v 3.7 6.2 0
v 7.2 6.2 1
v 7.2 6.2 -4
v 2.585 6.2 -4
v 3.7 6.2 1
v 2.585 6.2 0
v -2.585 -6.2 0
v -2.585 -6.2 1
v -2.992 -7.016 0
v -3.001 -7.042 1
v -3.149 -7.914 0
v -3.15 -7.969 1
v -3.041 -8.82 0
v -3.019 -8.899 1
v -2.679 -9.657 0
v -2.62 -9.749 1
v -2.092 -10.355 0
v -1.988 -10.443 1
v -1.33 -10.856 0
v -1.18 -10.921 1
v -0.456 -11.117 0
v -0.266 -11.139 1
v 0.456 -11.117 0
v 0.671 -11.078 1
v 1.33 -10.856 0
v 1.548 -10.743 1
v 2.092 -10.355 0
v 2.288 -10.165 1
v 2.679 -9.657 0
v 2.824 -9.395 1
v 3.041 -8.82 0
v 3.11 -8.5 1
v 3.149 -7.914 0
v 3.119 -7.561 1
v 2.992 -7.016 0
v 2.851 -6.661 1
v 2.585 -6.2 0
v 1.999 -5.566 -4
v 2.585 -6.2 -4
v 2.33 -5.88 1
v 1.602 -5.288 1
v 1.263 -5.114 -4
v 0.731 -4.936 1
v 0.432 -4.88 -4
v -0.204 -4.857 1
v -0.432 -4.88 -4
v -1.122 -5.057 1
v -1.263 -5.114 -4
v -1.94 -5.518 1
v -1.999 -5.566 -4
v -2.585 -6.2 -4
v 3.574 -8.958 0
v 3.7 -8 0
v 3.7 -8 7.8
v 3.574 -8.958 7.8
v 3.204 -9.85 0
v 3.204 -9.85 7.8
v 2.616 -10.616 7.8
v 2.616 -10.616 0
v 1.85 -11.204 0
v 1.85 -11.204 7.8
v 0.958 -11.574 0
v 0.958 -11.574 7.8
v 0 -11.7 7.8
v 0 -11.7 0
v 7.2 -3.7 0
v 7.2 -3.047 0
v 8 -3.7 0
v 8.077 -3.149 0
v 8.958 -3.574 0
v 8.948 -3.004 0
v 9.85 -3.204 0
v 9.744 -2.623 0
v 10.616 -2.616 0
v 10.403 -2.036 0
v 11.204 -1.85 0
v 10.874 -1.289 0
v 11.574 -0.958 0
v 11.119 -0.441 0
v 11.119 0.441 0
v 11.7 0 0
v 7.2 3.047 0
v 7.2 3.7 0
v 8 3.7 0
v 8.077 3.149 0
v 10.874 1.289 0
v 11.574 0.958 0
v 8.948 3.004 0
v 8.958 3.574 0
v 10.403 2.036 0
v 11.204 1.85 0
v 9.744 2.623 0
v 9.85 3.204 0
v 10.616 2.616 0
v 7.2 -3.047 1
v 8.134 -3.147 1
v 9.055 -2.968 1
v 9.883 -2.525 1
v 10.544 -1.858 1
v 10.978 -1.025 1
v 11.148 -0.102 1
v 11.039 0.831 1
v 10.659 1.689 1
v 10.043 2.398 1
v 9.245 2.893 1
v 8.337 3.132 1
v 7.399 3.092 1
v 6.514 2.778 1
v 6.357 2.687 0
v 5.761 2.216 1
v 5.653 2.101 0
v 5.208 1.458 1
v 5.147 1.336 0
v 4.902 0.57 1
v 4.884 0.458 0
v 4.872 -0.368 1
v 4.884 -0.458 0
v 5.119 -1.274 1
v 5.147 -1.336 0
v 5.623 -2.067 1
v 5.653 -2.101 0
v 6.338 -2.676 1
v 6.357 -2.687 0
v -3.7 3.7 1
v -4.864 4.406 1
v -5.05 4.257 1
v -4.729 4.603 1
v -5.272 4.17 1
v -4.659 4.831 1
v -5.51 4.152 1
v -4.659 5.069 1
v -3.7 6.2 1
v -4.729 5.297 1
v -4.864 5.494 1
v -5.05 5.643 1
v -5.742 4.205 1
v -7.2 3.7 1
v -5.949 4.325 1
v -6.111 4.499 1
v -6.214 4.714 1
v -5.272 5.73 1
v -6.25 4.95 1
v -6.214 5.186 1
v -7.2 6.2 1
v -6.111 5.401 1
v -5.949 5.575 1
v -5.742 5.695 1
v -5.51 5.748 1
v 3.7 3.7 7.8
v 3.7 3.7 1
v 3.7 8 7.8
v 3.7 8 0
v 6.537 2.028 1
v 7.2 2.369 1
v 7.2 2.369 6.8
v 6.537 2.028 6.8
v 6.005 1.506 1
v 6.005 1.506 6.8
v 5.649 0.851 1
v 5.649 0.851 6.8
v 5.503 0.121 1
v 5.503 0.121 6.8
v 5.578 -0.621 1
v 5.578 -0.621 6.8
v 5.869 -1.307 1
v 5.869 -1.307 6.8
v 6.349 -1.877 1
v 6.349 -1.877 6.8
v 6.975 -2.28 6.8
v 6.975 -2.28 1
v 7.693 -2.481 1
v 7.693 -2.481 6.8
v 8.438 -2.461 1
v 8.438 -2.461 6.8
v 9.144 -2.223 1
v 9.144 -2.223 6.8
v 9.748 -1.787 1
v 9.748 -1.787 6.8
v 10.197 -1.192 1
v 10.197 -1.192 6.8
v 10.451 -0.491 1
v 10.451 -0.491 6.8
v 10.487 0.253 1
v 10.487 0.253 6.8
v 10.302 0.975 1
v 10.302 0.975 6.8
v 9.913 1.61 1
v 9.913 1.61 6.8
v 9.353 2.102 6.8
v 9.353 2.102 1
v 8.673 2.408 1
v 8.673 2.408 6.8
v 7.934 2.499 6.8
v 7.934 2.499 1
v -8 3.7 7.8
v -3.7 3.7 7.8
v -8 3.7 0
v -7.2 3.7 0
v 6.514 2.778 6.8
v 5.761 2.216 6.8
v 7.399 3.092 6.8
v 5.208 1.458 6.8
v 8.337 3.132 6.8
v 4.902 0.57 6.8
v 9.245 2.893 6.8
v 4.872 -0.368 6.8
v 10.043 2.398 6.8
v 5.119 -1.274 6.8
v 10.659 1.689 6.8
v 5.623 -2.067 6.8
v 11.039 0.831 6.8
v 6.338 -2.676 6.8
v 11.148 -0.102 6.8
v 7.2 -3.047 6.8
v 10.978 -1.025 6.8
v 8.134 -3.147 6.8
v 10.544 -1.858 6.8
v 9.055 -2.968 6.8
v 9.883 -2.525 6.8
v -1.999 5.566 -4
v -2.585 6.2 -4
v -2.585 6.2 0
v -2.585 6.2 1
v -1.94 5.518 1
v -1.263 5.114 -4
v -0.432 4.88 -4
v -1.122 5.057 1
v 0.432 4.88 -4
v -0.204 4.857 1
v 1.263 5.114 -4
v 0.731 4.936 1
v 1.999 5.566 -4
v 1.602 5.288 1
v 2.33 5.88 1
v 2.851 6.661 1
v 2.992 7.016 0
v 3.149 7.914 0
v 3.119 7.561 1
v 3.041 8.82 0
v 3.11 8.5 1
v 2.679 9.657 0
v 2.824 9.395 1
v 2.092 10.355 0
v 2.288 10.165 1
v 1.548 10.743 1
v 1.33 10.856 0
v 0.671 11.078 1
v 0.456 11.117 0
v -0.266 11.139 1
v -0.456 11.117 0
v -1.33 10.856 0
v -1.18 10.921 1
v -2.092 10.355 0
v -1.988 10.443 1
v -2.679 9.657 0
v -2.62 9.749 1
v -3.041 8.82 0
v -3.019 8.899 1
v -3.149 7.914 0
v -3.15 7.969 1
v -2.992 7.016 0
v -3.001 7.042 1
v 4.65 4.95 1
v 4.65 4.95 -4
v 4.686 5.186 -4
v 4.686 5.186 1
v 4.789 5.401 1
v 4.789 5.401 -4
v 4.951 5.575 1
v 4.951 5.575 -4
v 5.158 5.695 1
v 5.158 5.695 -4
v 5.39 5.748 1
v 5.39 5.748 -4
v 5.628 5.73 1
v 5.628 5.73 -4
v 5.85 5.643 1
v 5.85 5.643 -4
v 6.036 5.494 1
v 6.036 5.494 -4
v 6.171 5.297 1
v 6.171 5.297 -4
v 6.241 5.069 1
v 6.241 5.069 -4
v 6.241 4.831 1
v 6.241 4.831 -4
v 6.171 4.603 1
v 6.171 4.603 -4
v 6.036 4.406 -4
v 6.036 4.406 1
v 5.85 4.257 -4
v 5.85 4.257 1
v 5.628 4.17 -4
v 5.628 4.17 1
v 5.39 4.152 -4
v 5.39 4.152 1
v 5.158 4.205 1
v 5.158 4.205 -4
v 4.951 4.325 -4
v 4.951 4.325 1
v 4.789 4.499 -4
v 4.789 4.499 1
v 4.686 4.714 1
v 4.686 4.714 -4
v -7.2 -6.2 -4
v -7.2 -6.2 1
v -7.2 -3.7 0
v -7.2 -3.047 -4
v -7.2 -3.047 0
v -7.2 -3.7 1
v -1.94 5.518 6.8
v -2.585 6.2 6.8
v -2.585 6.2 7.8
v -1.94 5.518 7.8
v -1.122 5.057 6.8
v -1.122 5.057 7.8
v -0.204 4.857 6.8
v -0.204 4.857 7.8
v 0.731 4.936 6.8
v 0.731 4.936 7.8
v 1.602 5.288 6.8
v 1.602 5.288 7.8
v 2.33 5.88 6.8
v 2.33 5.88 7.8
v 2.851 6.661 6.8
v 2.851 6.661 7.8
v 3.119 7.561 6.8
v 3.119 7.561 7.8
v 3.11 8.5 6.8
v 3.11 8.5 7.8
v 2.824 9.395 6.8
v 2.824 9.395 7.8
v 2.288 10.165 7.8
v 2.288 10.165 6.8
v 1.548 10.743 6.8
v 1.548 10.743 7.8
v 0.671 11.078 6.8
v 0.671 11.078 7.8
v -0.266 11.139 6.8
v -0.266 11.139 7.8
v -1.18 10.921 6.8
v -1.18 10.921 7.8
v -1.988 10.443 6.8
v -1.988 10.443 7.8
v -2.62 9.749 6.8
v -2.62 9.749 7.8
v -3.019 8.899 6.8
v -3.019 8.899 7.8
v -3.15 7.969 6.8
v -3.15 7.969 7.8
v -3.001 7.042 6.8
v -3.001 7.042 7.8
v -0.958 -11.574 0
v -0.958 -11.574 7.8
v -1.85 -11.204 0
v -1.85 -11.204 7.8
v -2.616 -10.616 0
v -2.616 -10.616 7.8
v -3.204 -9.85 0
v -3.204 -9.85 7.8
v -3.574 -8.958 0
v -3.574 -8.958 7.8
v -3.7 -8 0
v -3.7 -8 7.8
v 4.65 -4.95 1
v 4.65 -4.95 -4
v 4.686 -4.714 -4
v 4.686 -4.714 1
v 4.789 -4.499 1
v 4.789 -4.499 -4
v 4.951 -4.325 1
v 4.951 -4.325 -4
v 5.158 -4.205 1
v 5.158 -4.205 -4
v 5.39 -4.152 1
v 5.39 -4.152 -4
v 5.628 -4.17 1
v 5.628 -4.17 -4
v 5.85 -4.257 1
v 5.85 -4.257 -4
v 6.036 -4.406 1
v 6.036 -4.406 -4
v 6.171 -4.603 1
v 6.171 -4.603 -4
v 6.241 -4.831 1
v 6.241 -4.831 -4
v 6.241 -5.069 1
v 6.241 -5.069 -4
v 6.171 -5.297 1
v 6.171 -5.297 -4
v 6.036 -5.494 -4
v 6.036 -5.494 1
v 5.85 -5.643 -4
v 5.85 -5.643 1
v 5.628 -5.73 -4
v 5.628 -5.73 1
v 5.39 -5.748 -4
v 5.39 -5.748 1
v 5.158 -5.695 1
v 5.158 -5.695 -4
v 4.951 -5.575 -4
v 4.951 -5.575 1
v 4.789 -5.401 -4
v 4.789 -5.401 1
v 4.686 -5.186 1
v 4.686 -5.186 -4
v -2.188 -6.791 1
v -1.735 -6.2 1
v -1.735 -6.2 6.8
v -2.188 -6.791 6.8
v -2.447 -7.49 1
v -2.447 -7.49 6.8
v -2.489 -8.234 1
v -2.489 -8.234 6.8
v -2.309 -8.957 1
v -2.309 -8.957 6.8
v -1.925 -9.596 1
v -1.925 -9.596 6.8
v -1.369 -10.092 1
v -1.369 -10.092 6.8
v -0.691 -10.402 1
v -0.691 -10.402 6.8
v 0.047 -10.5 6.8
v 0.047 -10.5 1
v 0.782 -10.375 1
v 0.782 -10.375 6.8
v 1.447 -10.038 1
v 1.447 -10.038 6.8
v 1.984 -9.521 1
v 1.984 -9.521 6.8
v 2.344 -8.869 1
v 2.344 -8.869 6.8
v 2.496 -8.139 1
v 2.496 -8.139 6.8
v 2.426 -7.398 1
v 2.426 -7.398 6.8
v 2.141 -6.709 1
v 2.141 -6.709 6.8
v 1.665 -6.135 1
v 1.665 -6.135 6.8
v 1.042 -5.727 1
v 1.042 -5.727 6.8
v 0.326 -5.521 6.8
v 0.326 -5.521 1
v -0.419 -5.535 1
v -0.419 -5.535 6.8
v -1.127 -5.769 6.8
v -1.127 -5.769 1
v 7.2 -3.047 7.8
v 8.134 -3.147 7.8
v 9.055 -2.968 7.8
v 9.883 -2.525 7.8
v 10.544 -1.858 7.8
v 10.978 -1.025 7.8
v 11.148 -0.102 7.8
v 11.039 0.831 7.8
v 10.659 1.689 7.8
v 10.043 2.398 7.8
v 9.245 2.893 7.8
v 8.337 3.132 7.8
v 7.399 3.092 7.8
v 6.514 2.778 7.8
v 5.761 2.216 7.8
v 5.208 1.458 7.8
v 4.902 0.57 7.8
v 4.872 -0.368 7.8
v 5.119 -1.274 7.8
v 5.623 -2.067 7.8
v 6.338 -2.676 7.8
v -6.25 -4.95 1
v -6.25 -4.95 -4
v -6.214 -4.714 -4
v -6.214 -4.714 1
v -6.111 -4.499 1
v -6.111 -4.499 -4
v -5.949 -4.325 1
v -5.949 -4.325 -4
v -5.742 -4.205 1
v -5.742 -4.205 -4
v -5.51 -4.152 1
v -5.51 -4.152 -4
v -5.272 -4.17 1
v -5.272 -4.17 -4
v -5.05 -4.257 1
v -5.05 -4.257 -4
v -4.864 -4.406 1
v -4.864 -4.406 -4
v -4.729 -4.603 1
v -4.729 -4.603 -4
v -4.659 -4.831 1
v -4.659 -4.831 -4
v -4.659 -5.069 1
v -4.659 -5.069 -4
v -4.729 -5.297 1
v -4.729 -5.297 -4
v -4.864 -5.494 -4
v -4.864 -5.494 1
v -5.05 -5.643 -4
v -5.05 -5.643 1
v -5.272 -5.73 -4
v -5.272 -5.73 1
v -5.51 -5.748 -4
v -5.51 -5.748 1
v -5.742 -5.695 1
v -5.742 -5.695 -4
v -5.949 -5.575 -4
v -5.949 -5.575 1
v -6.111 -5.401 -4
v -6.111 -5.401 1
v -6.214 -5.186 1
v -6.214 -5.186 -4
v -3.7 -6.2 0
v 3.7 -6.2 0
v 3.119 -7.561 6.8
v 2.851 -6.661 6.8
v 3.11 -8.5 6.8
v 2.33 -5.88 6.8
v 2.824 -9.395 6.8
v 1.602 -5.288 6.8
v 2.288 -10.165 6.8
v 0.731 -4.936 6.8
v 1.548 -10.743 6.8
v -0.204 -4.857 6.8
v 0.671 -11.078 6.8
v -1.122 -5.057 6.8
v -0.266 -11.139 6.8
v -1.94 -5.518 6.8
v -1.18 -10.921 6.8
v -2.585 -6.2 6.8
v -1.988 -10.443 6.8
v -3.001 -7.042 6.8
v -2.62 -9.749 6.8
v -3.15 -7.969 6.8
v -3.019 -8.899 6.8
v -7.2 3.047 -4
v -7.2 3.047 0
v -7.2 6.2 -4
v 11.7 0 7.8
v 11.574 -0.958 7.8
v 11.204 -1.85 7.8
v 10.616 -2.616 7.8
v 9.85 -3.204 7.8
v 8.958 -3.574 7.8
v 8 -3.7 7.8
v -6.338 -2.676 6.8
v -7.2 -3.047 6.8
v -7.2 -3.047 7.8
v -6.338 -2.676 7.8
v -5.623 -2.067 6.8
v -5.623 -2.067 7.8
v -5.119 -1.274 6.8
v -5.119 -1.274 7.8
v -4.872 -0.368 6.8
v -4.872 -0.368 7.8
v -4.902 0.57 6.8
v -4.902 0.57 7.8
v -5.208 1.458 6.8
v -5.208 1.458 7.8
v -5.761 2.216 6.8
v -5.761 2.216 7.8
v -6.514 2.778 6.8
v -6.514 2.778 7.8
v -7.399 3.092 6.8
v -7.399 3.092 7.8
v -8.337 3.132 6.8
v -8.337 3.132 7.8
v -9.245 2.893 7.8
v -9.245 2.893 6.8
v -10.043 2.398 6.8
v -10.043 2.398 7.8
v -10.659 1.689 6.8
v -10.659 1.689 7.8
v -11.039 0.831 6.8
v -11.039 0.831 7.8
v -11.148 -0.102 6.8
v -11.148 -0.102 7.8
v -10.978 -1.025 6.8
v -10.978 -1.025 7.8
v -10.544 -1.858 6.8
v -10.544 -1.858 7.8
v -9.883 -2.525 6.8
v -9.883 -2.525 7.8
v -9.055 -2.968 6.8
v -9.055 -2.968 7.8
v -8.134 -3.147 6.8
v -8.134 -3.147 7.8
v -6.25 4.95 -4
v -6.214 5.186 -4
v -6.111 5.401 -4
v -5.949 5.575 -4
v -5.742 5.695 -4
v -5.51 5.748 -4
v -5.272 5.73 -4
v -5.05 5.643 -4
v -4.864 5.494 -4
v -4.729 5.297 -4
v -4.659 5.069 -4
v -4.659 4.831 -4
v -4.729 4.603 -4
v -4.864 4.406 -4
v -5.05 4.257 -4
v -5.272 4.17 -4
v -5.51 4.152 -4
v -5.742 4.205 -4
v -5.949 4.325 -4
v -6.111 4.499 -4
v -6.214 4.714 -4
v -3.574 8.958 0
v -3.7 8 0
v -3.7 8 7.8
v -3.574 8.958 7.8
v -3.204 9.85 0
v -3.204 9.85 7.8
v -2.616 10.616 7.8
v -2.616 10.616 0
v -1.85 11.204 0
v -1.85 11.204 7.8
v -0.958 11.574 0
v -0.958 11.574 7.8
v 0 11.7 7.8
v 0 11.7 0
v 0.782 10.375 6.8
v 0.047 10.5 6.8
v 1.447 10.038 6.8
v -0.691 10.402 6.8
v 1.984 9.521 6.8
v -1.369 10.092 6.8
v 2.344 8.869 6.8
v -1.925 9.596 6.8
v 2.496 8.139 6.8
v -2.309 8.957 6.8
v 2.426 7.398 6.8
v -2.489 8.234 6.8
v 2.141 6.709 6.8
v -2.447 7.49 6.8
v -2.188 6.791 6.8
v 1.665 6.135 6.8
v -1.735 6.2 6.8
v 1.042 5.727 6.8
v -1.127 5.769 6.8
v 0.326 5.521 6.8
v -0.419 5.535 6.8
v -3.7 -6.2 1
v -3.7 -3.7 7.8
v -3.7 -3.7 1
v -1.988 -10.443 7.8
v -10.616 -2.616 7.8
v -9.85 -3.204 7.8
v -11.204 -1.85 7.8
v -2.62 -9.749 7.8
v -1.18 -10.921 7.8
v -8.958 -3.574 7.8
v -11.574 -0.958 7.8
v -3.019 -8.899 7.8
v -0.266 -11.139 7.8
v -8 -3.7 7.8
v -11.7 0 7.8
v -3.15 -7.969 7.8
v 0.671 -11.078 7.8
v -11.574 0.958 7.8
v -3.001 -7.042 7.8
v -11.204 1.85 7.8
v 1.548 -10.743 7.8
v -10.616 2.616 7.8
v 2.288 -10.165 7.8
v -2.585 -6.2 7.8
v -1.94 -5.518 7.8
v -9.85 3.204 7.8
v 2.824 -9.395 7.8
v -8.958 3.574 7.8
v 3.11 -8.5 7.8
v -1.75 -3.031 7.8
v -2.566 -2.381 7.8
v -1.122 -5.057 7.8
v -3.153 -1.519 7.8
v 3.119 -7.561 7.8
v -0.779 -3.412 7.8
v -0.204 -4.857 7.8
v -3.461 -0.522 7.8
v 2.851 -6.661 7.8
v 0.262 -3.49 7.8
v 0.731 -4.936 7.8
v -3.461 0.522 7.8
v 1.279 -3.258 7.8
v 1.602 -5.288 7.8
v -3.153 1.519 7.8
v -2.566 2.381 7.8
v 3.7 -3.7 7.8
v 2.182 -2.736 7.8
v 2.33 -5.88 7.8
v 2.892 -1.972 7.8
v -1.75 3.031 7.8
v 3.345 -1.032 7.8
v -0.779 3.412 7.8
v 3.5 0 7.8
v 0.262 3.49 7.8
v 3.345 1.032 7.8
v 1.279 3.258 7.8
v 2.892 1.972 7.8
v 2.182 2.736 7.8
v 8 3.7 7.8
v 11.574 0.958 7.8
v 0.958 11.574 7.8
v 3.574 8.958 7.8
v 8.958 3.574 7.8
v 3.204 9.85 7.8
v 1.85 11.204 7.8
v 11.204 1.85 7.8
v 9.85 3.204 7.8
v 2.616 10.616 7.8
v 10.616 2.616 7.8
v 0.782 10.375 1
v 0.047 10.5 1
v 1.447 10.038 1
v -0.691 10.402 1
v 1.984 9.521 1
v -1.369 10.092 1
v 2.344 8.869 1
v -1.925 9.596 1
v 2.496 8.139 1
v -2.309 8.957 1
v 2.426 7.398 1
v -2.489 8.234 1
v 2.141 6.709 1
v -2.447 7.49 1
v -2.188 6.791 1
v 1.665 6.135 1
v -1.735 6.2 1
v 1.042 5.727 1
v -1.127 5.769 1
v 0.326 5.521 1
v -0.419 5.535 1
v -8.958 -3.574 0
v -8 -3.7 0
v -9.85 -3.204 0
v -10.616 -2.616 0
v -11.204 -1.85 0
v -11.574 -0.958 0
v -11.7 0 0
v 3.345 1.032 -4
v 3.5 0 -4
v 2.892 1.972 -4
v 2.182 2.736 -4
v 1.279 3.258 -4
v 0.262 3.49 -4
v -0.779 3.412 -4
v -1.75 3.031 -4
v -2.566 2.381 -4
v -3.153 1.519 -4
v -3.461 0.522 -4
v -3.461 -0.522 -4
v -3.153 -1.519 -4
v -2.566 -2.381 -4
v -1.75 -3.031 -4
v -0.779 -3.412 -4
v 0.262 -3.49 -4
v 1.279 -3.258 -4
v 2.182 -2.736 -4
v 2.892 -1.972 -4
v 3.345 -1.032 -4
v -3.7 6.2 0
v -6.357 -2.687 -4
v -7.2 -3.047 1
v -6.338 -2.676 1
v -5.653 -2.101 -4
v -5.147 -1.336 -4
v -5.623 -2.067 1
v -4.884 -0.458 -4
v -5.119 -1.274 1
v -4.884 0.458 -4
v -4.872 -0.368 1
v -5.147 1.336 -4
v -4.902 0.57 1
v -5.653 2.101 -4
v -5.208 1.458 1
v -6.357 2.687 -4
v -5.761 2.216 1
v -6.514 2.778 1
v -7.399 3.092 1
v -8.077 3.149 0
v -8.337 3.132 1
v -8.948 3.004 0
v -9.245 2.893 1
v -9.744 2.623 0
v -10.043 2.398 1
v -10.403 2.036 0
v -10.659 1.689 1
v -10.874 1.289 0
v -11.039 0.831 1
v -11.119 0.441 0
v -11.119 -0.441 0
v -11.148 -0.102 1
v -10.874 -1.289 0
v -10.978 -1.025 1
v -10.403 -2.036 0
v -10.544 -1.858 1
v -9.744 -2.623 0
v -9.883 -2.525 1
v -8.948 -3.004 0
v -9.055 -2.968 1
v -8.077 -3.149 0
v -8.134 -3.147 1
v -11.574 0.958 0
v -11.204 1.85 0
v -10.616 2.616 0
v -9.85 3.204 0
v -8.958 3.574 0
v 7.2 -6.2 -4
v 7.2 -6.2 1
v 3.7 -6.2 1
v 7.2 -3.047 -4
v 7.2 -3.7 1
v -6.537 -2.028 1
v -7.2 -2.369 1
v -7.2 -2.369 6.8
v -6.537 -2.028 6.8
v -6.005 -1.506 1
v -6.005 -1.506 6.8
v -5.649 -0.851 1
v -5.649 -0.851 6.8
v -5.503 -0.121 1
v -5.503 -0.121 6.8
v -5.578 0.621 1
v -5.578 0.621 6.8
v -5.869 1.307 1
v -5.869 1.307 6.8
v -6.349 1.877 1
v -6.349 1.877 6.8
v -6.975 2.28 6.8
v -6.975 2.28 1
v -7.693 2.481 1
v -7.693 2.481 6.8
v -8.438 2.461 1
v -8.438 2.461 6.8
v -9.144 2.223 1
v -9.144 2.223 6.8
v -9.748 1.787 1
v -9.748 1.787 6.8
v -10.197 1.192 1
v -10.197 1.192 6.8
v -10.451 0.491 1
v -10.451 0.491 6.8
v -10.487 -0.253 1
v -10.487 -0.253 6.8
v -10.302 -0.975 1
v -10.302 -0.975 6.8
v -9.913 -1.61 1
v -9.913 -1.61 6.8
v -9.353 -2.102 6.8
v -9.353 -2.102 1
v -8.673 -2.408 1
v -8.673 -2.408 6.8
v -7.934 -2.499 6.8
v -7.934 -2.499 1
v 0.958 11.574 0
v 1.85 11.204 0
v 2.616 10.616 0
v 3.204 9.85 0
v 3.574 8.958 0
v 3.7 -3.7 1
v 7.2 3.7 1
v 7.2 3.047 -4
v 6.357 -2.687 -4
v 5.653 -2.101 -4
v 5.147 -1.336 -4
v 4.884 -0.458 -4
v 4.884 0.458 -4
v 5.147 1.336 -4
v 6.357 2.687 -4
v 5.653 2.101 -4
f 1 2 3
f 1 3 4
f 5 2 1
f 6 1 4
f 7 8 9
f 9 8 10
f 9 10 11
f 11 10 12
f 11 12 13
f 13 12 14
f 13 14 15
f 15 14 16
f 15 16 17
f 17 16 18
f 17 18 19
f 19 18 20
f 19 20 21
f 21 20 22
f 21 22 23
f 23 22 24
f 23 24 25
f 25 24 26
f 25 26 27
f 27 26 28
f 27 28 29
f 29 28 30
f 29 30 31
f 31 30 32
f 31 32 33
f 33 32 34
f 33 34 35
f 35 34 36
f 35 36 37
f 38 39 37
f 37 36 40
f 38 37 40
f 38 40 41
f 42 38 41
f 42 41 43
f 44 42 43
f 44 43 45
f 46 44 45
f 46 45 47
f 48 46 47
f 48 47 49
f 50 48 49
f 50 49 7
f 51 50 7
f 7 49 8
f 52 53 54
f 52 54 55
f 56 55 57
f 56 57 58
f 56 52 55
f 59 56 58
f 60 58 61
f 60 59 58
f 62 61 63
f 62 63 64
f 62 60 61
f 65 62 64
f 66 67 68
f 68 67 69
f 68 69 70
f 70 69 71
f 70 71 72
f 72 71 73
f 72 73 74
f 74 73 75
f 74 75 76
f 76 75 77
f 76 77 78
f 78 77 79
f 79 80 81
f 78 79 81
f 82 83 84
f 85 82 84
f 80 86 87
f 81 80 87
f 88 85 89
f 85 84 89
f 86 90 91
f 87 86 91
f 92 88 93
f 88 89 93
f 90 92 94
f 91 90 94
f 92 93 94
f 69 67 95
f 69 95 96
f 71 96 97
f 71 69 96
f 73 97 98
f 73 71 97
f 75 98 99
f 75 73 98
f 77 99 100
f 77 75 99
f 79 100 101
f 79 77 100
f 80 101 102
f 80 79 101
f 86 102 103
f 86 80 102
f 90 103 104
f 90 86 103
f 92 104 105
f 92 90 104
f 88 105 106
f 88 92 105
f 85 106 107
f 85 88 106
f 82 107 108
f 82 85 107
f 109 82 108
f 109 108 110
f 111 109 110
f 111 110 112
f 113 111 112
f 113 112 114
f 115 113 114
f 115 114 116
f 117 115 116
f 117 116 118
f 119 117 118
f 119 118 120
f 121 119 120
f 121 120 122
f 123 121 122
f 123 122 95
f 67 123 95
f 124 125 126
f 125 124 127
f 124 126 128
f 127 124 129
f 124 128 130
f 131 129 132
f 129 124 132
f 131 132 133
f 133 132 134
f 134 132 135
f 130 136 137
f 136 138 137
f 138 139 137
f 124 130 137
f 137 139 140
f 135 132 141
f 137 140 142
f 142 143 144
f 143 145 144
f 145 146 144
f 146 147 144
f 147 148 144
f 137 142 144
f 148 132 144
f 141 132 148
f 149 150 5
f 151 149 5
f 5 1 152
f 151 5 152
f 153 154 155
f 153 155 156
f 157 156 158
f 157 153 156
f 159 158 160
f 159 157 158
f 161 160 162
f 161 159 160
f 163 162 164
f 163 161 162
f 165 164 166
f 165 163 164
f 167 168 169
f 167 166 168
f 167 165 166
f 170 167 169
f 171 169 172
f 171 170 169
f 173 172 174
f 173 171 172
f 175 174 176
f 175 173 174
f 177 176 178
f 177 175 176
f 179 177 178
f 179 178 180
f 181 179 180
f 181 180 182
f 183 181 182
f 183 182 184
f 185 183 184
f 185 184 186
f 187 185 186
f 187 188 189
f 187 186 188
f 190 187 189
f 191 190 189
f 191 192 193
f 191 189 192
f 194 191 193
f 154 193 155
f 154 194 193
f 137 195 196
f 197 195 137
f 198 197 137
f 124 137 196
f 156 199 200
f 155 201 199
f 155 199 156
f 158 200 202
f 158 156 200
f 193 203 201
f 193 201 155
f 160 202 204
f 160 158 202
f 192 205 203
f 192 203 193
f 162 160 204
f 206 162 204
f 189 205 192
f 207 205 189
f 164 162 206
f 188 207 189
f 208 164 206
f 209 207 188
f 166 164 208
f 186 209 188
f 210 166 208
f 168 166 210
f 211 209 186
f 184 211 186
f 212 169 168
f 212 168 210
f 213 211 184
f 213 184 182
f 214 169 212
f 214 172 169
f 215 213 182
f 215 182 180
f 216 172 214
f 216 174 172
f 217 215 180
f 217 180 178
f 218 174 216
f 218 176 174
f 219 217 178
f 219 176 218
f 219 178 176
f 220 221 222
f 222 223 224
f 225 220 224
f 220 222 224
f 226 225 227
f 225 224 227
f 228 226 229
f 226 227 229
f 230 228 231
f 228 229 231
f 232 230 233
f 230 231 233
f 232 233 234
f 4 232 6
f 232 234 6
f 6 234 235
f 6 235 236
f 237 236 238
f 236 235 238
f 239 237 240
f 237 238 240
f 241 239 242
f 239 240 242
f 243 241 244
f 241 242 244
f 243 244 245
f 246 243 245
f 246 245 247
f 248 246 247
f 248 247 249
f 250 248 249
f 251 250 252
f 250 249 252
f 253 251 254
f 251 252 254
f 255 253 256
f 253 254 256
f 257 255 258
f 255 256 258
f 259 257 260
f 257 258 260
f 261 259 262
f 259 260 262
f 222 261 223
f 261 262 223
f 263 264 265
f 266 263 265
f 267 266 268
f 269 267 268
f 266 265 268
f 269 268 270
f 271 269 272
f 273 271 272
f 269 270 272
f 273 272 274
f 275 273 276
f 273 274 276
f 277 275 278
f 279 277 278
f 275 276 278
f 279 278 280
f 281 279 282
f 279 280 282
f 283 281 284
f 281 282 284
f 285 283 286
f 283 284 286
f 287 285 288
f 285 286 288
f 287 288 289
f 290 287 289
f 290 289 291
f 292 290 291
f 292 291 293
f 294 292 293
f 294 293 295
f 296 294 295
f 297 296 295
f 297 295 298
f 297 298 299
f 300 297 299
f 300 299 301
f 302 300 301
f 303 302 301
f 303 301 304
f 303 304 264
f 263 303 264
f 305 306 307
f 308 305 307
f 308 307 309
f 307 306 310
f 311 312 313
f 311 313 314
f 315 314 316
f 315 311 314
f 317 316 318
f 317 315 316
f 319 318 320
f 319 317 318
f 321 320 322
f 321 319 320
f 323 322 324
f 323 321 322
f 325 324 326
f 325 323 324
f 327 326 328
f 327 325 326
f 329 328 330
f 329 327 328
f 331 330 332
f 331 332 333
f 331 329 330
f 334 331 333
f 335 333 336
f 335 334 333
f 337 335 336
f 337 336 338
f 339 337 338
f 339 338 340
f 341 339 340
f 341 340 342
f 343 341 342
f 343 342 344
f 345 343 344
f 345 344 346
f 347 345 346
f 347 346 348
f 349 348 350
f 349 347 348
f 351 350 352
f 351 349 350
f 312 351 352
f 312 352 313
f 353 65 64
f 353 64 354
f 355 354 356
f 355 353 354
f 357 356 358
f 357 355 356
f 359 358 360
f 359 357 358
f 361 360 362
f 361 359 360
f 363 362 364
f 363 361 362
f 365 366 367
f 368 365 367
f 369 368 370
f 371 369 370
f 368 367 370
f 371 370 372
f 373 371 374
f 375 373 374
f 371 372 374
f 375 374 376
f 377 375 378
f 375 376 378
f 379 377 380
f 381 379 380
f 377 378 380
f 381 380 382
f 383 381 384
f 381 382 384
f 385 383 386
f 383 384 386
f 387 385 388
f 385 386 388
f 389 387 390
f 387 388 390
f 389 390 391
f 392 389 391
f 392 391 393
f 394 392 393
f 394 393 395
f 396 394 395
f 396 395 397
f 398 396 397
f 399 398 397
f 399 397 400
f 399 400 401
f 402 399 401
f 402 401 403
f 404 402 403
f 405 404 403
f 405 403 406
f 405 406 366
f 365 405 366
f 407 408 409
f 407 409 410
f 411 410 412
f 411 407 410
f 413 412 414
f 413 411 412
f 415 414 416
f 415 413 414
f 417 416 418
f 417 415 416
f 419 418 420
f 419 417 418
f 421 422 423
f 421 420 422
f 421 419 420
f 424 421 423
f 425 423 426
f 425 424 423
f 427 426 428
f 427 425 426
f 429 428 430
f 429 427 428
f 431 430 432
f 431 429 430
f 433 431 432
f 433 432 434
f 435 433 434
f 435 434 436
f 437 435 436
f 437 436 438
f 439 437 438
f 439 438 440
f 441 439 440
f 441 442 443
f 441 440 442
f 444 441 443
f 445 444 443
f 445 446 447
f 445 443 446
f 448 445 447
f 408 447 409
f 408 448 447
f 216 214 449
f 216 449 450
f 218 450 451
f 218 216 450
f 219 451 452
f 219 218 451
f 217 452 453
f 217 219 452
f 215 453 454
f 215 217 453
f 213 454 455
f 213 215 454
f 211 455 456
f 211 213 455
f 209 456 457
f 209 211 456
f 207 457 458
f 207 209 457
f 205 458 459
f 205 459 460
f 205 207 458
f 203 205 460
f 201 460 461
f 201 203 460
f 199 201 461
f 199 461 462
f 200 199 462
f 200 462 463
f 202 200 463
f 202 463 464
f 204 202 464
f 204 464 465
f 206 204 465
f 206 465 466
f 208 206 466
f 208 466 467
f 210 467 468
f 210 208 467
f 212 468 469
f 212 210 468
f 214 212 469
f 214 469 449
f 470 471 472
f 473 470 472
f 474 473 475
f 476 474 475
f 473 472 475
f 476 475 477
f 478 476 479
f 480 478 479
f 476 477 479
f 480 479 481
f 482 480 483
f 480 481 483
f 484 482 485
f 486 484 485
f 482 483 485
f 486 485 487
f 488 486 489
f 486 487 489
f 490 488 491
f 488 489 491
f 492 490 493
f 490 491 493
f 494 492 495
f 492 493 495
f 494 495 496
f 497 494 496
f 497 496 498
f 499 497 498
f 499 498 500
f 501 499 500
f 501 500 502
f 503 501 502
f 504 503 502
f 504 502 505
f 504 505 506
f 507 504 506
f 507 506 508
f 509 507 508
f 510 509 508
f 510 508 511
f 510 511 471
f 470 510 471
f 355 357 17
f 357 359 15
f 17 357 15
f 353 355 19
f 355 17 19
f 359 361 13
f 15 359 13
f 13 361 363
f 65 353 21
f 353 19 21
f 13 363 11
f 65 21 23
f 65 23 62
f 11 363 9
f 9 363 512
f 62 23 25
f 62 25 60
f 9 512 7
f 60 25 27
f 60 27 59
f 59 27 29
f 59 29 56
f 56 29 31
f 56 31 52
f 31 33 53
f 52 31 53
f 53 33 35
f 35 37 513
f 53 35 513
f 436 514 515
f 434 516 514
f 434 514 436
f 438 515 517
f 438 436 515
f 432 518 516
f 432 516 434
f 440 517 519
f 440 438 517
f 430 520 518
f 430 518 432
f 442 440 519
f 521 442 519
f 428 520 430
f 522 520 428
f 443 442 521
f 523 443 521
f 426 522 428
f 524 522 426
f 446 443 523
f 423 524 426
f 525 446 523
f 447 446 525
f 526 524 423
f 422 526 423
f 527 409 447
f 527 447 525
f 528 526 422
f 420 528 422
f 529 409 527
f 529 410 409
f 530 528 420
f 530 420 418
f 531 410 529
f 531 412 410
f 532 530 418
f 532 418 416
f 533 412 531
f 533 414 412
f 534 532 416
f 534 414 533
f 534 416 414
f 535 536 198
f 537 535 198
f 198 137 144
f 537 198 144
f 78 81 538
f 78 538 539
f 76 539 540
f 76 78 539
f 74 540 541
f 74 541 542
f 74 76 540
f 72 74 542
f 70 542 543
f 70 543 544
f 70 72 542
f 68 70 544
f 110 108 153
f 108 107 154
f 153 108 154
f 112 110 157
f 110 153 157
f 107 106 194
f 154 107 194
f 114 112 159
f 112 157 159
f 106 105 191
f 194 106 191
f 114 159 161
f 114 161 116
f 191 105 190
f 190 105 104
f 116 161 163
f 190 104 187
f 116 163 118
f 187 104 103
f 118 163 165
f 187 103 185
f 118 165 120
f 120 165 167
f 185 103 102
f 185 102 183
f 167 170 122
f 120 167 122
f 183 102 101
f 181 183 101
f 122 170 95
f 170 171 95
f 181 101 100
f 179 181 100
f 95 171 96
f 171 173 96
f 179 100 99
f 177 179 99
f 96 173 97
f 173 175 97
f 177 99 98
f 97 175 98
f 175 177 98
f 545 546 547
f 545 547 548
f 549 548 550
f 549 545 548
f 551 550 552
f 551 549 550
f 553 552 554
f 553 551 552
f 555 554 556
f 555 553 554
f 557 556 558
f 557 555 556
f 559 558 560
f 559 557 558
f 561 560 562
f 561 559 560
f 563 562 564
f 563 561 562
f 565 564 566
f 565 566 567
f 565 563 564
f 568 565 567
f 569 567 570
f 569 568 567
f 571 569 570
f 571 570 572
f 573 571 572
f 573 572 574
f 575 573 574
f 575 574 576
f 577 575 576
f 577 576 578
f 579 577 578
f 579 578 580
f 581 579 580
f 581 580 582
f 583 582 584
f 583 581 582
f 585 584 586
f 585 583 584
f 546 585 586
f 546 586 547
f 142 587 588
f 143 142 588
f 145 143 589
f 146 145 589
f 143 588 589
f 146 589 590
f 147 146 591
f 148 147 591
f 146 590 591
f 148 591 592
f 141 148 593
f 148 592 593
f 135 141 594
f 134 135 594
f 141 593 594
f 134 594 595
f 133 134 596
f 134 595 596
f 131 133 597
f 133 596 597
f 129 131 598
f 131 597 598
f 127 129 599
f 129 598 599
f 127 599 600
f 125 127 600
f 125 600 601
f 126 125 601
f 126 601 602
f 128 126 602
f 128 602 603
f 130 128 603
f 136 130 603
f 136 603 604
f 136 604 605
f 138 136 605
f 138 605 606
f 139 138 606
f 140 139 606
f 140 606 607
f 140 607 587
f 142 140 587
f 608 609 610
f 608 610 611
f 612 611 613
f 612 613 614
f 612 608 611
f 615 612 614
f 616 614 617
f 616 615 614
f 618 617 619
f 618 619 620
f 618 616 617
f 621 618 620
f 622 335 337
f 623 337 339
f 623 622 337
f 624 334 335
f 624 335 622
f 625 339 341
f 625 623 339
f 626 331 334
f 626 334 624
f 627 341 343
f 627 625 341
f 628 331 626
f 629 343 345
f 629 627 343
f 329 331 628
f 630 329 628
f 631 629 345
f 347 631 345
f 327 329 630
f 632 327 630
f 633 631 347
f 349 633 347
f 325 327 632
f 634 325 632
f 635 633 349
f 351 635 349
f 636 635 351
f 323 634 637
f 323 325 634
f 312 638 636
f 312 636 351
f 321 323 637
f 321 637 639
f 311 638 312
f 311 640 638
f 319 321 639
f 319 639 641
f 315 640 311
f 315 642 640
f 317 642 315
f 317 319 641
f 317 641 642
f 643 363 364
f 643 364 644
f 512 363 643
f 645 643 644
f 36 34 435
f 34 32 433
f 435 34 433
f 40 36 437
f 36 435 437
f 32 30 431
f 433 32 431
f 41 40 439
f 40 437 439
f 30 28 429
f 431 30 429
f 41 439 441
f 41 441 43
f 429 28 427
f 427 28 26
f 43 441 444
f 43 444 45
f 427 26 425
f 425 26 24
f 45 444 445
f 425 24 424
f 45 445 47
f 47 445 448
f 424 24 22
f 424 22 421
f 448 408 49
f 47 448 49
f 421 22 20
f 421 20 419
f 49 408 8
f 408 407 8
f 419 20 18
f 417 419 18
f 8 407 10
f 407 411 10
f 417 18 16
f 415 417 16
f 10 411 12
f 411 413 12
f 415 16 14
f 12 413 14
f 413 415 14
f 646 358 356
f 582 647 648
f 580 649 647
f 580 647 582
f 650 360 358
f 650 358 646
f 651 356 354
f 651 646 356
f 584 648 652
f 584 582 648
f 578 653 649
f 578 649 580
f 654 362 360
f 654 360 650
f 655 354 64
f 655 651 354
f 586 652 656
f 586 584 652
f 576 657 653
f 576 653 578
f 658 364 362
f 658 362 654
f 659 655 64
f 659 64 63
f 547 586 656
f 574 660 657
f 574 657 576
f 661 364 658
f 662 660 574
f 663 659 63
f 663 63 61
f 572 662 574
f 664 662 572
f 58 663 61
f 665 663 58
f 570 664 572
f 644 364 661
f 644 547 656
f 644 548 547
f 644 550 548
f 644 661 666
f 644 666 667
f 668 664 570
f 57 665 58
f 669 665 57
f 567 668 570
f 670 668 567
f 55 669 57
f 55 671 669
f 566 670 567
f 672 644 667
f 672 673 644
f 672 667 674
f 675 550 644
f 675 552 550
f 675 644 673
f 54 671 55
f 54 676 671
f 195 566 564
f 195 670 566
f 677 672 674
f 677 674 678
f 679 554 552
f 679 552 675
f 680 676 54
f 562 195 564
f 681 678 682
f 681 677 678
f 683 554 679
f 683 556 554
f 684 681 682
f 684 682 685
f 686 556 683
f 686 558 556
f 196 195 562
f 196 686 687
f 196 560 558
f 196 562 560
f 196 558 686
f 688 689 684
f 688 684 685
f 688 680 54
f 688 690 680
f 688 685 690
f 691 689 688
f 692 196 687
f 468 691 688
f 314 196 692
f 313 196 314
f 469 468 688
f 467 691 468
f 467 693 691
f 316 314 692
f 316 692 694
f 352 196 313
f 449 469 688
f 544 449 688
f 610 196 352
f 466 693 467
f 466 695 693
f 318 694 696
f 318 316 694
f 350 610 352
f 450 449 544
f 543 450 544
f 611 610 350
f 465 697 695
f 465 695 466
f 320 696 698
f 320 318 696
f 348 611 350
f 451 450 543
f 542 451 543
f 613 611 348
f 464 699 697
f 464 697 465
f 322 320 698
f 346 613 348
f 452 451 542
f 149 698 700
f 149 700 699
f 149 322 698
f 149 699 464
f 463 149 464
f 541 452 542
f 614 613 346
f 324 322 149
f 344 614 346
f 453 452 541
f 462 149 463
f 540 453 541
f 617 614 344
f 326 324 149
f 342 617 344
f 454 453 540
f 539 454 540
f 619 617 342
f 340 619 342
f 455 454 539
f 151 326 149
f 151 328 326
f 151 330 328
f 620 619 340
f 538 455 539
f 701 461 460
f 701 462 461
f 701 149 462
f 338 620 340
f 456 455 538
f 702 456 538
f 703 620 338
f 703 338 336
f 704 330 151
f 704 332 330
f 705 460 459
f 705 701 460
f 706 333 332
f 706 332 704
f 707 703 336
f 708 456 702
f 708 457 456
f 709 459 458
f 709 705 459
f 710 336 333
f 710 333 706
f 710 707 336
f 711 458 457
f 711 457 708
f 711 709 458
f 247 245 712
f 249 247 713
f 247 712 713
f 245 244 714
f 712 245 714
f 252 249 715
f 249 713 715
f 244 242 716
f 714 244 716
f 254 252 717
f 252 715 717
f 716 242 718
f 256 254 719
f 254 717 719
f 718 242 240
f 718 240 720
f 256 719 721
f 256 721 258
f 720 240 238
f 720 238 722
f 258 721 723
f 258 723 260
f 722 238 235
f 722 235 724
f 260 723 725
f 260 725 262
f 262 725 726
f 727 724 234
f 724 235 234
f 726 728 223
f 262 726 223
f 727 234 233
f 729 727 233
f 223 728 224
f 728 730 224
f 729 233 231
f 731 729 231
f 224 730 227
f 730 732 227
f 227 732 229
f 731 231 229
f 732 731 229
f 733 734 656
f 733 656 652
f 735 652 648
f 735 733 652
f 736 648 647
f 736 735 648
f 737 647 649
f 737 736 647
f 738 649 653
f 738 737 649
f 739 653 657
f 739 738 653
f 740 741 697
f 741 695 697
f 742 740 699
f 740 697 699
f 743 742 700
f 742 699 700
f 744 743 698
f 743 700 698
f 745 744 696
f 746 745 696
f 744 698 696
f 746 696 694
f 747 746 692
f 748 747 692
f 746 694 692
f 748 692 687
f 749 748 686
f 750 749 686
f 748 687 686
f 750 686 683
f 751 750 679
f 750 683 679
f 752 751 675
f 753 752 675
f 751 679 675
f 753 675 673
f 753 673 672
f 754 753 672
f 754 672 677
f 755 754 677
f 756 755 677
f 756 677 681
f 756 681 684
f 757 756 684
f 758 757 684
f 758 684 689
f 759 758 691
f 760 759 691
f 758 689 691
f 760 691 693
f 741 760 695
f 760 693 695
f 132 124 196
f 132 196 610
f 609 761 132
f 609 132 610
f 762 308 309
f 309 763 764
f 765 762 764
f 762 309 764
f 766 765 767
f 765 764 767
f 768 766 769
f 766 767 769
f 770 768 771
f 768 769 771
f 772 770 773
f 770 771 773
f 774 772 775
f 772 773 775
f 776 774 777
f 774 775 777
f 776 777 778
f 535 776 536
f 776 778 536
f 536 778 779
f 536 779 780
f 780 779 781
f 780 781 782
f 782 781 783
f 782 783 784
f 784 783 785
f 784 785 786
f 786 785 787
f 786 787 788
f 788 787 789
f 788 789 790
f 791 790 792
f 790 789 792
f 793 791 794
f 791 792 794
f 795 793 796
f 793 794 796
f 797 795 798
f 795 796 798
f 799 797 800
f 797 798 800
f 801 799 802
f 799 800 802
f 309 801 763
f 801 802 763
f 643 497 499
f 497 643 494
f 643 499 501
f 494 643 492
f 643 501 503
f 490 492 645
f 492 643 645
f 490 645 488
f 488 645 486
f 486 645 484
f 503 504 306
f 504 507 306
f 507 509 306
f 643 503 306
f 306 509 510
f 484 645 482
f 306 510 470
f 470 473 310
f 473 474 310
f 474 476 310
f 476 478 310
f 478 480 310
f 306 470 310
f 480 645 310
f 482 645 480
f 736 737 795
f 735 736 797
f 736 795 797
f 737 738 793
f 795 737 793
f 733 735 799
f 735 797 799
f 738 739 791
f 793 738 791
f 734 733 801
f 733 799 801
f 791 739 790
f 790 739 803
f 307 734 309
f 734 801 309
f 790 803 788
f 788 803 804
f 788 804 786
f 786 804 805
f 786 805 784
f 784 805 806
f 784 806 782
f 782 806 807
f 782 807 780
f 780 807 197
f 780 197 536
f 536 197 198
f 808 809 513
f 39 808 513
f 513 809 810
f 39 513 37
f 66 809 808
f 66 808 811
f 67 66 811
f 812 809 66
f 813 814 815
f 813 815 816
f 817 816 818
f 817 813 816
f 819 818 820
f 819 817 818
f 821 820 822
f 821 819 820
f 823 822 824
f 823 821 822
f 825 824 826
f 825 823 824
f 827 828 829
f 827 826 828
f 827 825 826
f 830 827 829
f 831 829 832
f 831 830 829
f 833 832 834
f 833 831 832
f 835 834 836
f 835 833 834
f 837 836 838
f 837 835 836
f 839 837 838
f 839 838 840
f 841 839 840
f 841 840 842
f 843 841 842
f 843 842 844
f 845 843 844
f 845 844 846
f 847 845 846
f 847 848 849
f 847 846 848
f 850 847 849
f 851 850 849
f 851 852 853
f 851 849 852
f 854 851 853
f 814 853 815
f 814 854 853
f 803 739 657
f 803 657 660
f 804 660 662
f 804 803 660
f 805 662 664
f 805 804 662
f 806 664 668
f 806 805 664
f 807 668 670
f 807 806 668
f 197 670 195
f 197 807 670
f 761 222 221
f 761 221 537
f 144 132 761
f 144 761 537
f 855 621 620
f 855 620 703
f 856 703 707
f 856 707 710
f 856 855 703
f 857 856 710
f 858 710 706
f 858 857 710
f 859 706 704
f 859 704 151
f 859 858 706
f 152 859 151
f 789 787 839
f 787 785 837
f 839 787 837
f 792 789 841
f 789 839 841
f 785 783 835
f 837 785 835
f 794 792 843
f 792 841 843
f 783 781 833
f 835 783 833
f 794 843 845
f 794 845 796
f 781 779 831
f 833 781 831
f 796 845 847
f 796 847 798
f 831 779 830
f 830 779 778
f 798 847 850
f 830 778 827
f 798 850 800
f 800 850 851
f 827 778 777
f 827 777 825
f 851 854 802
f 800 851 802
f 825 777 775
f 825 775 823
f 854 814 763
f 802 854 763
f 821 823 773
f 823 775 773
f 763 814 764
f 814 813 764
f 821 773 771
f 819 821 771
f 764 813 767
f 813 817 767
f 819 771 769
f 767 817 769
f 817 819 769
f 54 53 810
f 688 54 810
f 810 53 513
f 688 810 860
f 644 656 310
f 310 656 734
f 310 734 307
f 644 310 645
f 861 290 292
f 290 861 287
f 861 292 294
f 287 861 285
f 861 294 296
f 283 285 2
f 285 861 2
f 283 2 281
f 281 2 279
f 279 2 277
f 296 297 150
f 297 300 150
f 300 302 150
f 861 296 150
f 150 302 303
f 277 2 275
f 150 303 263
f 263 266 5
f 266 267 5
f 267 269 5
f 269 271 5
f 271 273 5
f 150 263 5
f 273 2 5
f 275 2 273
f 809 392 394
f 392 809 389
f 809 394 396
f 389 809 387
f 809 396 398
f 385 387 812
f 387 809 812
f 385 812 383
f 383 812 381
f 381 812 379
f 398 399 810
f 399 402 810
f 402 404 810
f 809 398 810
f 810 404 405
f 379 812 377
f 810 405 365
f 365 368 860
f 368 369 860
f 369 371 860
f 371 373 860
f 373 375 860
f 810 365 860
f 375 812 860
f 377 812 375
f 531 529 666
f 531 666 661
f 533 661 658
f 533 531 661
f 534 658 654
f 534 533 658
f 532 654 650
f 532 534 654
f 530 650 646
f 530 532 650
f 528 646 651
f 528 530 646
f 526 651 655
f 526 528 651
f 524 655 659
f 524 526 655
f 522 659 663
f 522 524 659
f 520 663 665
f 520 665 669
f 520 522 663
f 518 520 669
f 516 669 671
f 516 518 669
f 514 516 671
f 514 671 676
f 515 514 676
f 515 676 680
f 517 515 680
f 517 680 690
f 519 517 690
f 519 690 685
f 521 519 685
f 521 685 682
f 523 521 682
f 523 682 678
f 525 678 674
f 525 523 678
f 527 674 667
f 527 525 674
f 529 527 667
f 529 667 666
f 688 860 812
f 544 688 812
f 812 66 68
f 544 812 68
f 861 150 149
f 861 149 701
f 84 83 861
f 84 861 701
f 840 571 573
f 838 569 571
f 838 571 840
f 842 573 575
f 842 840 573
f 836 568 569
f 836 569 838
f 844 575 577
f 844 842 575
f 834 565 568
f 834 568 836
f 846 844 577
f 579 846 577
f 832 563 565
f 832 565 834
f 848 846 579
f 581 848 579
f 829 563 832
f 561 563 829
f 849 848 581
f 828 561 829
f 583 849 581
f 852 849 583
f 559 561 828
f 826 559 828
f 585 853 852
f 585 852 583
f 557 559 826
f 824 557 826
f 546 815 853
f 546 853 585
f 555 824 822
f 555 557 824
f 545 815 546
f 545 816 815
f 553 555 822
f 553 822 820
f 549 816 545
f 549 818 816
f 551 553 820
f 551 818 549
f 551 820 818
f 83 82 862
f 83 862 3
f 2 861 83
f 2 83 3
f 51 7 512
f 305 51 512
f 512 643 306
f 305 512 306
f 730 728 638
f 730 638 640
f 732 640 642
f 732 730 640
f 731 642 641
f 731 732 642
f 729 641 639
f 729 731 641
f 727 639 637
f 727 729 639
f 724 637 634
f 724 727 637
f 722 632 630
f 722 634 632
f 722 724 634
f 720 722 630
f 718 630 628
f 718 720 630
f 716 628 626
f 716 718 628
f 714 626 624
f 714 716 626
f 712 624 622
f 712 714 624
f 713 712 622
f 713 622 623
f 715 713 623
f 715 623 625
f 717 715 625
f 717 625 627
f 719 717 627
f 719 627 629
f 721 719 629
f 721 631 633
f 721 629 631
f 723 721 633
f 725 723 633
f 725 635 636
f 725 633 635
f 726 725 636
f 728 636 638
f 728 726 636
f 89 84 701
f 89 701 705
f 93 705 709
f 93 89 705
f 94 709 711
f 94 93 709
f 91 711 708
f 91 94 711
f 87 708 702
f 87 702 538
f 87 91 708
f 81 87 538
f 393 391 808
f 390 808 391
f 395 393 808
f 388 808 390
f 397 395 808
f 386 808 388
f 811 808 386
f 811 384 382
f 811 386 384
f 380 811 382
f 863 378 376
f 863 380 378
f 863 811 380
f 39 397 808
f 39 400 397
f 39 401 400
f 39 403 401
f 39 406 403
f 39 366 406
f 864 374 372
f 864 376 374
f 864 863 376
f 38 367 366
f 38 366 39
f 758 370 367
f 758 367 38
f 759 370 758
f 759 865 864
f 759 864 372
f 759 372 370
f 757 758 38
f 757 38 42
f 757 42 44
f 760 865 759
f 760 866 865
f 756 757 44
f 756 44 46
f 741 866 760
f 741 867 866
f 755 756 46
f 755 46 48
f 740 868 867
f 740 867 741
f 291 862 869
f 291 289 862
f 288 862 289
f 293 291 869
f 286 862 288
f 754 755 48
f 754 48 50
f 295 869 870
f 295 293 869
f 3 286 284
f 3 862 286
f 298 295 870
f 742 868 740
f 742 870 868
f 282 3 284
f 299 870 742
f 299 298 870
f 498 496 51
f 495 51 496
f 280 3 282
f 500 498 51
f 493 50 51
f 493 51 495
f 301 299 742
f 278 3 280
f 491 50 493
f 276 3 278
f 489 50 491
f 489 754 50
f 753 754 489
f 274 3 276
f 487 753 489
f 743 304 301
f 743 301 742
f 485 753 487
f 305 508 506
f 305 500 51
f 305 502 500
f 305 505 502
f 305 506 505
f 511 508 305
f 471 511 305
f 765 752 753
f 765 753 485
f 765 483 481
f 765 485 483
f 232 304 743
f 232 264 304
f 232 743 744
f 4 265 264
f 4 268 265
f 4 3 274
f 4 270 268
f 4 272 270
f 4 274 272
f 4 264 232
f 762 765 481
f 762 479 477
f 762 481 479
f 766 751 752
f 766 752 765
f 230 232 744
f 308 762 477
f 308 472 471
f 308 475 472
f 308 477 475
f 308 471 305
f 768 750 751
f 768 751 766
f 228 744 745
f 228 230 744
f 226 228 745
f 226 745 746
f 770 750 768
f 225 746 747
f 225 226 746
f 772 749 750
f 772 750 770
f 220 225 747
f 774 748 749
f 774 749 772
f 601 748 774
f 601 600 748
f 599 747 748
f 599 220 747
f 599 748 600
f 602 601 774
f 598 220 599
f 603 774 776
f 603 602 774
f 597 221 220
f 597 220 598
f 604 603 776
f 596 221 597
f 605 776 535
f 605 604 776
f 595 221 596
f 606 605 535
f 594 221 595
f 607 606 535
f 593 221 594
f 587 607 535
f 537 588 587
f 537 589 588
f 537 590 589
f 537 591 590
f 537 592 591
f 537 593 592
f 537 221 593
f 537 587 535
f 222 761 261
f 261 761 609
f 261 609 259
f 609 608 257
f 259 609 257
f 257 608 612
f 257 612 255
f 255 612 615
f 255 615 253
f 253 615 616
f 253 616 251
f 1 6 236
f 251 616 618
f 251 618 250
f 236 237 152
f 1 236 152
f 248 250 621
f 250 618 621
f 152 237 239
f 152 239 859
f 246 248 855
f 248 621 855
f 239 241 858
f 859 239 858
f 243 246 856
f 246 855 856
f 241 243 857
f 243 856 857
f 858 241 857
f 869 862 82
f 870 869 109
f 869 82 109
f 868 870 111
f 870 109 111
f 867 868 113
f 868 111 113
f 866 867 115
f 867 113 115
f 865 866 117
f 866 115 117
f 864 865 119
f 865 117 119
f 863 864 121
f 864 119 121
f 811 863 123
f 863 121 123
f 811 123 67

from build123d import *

# Parameters (mm, degrees)
SKETCH_2_W          = 23.4
SKETCH_2_H          = 7.4
SKETCH_2_W_2        = 7.4
SKETCH_2_H_2        = 23.4
EXTRUDE_1_DEPTH     = 7.8
EXTRUDE_START       = -1
SKETCH_3_W          = 14.4
SKETCH_3_H          = 12.4
EXTRUDE_2_DEPTH     = 5
SKETCH_2_6_R        = 2.5
SKETCH_2_6_R_2      = 3.5
CUT_EXTRUDE_3_DEPTH = 19.292621463
SKETCH_2_3_R        = 3.15
CUT_EXTRUDE_1_DEPTH = 1
CUT_EXTRUDE_START   = 6.8
SKETCH_2_5_R        = 3.15
CUT_EXTRUDE_2_DEPTH = 1
SKETCH_4_R          = 0.8
CUT_EXTRUDE_4_DEPTH = 21.322893495
SKETCH_2_7_R        = 3.5
SKETCH_2_7_R_2      = 3.15
CUT_EXTRUDE_5_DEPTH = 19.292621463


with BuildPart() as part:
    # 草图2 → 凸台-拉伸1 (new body)
    with BuildSketch(Plane.XY):
        Rectangle(SKETCH_2_W, SKETCH_2_H)
        Rectangle(SKETCH_2_W_2, SKETCH_2_H_2)
    extrude(amount=EXTRUDE_1_DEPTH)

    # 草图3 → 凸台-拉伸2 (add)
    with BuildSketch(Plane(origin=(0, 0, 0), x_dir=(-1, 0, 0), z_dir=(0, 0, -1)).offset(EXTRUDE_START)):
        Rectangle(SKETCH_3_W, SKETCH_3_H)
    extrude(amount=EXTRUDE_2_DEPTH)

    # 草图2<6> → 切除-拉伸3 (cut, through all)
    with BuildSketch(Plane.XY):
        with BuildLine():
            Line((-3.7, 11.7), (-3.7, 8))
            ThreePointArc((-3.7, 8), (-2.61629509, 10.61629509), (0, 11.7))
            Line((0, 11.7), (-3.7, 11.7))
        make_face()
        with BuildLine():
            ThreePointArc((0, 11.7), (2.61629509, 10.61629509), (3.7, 8))
            Line((3.7, 8), (3.7, 11.7))
            Line((3.7, 11.7), (0, 11.7))
        make_face()
        with BuildLine():
            Line((11.7, 3.7), (8.000000006, 3.7))
            ThreePointArc((8.000000006, 3.7), (10.616295093, 2.616295088), (11.7, 0))
            Line((11.7, 0), (11.7, 3.7))
        make_face()
        with BuildLine():
            ThreePointArc((11.7, 0), (10.616295085, -2.616295096), (7.999999984, -3.7))
            Line((7.999999984, -3.7), (11.7, -3.7))
            Line((11.7, -3.7), (11.7, 0))
        make_face()
        with BuildLine():
            Line((3.7, -11.7), (3.7, -8))
            ThreePointArc((3.7, -8), (2.61629509, -10.61629509), (0, -11.7))
            Line((0, -11.7), (3.7, -11.7))
        make_face()
        with BuildLine():
            ThreePointArc((0, -11.7), (-2.616295094, -10.616295087), (-3.7, -7.99999999))
            Line((-3.7, -7.99999999), (-3.7, -11.7))
            Line((-3.7, -11.7), (0, -11.7))
        make_face()
        with BuildLine():
            Line((-11.7, -1.1e-08), (-11.7, -3.7))
            Line((-11.7, -3.7), (-8.000000004, -3.7))
            ThreePointArc((-8.000000004, -3.7), (-10.616295088, -2.616295093), (-11.7, -1.1e-08))
        make_face()
        with BuildLine():
            Line((-11.7, 3.7), (-11.7, -1.1e-08))
            ThreePointArc((-11.7, -1.1e-08), (-10.616295094, 2.616295086), (-8, 3.7))
            Line((-8, 3.7), (-11.7, 3.7))
        make_face()
        with Locations(Location((0, 8, 0), (0, 0, 226.054480438))):
            Circle(SKETCH_2_6_R)
        with Locations(Location((-8, 0, 0), (0, 0, 288.662924885))):
            Circle(SKETCH_2_6_R)
        Circle(SKETCH_2_6_R_2)
        with Locations(Location((8, 0, 0), (0, 0, 108.662924885))):
            Circle(SKETCH_2_6_R)
        with Locations(Location((0, -8, 0), (0, 0, 133.945519562))):
            Circle(SKETCH_2_6_R)
    extrude(amount=CUT_EXTRUDE_3_DEPTH, mode=Mode.SUBTRACT)

    # 草图2<3> → 切除-拉伸1 (cut)
    with BuildSketch(Plane.XY):
        with Locations(Location((8, 0, 0), (0, 0, 255.287542039))):
            Circle(SKETCH_2_3_R)
        with Locations(Location((-8, 0, 0), (0, 0, 284.712457961))):
            Circle(SKETCH_2_3_R)
        with Locations(Location((0, 8, 0), (0, 0, 214.849904579))):
            Circle(SKETCH_2_3_R)
        with Locations(Location((0, -8, 0), (0, 0, 145.150095421))):
            Circle(SKETCH_2_3_R)
    extrude(amount=CUT_EXTRUDE_1_DEPTH, mode=Mode.SUBTRACT)

    # 草图2<5> → 切除-拉伸2 (cut)
    with BuildSketch(Plane.XY.offset(CUT_EXTRUDE_START)):
        with Locations(Location((8, 0, 0), (0, 0, 255.287542039))):
            Circle(SKETCH_2_5_R)
        with Locations(Location((-8, 0, 0), (0, 0, 284.712457961))):
            Circle(SKETCH_2_5_R)
        with Locations(Location((0, 8, 0), (0, 0, 214.849904579))):
            Circle(SKETCH_2_5_R)
        with Locations(Location((0, -8, 0), (0, 0, 145.150095421))):
            Circle(SKETCH_2_5_R)
    extrude(amount=CUT_EXTRUDE_2_DEPTH, mode=Mode.SUBTRACT)

    # 草图4 → 切除-拉伸4 (cut, through all)
    with BuildSketch(Plane(origin=(0, 0, -4), x_dir=(-1, 0, 0), z_dir=(0, 0, -1))):
        with Locations((5.45, 4.95)):
            Circle(SKETCH_4_R)
        with Locations((-5.45, 4.95)):
            Circle(SKETCH_4_R)
        with Locations((5.45, -4.95)):
            Circle(SKETCH_4_R)
        with Locations((-5.45, -4.95)):
            Circle(SKETCH_4_R)
    extrude(amount=-CUT_EXTRUDE_4_DEPTH, mode=Mode.SUBTRACT)

    # 草图2<7> → 切除-拉伸5 (cut, through all)
    with BuildSketch(Plane.XY):
        Circle(SKETCH_2_7_R)
        with Locations(Location((8, 0, 0), (0, 0, 104.712457961))):
            Circle(SKETCH_2_7_R_2)
        with Locations(Location((-8, 0, 0), (0, 0, 284.712457961))):
            Circle(SKETCH_2_7_R_2)
        with Locations(Location((0, 8, 0), (0, 0, 214.849904579))):
            Circle(SKETCH_2_7_R_2)
        with Locations(Location((0, -8, 0), (0, 0, 145.150095421))):
            Circle(SKETCH_2_7_R_2)
    extrude(amount=-CUT_EXTRUDE_5_DEPTH, mode=Mode.SUBTRACT)


solid = part.part
